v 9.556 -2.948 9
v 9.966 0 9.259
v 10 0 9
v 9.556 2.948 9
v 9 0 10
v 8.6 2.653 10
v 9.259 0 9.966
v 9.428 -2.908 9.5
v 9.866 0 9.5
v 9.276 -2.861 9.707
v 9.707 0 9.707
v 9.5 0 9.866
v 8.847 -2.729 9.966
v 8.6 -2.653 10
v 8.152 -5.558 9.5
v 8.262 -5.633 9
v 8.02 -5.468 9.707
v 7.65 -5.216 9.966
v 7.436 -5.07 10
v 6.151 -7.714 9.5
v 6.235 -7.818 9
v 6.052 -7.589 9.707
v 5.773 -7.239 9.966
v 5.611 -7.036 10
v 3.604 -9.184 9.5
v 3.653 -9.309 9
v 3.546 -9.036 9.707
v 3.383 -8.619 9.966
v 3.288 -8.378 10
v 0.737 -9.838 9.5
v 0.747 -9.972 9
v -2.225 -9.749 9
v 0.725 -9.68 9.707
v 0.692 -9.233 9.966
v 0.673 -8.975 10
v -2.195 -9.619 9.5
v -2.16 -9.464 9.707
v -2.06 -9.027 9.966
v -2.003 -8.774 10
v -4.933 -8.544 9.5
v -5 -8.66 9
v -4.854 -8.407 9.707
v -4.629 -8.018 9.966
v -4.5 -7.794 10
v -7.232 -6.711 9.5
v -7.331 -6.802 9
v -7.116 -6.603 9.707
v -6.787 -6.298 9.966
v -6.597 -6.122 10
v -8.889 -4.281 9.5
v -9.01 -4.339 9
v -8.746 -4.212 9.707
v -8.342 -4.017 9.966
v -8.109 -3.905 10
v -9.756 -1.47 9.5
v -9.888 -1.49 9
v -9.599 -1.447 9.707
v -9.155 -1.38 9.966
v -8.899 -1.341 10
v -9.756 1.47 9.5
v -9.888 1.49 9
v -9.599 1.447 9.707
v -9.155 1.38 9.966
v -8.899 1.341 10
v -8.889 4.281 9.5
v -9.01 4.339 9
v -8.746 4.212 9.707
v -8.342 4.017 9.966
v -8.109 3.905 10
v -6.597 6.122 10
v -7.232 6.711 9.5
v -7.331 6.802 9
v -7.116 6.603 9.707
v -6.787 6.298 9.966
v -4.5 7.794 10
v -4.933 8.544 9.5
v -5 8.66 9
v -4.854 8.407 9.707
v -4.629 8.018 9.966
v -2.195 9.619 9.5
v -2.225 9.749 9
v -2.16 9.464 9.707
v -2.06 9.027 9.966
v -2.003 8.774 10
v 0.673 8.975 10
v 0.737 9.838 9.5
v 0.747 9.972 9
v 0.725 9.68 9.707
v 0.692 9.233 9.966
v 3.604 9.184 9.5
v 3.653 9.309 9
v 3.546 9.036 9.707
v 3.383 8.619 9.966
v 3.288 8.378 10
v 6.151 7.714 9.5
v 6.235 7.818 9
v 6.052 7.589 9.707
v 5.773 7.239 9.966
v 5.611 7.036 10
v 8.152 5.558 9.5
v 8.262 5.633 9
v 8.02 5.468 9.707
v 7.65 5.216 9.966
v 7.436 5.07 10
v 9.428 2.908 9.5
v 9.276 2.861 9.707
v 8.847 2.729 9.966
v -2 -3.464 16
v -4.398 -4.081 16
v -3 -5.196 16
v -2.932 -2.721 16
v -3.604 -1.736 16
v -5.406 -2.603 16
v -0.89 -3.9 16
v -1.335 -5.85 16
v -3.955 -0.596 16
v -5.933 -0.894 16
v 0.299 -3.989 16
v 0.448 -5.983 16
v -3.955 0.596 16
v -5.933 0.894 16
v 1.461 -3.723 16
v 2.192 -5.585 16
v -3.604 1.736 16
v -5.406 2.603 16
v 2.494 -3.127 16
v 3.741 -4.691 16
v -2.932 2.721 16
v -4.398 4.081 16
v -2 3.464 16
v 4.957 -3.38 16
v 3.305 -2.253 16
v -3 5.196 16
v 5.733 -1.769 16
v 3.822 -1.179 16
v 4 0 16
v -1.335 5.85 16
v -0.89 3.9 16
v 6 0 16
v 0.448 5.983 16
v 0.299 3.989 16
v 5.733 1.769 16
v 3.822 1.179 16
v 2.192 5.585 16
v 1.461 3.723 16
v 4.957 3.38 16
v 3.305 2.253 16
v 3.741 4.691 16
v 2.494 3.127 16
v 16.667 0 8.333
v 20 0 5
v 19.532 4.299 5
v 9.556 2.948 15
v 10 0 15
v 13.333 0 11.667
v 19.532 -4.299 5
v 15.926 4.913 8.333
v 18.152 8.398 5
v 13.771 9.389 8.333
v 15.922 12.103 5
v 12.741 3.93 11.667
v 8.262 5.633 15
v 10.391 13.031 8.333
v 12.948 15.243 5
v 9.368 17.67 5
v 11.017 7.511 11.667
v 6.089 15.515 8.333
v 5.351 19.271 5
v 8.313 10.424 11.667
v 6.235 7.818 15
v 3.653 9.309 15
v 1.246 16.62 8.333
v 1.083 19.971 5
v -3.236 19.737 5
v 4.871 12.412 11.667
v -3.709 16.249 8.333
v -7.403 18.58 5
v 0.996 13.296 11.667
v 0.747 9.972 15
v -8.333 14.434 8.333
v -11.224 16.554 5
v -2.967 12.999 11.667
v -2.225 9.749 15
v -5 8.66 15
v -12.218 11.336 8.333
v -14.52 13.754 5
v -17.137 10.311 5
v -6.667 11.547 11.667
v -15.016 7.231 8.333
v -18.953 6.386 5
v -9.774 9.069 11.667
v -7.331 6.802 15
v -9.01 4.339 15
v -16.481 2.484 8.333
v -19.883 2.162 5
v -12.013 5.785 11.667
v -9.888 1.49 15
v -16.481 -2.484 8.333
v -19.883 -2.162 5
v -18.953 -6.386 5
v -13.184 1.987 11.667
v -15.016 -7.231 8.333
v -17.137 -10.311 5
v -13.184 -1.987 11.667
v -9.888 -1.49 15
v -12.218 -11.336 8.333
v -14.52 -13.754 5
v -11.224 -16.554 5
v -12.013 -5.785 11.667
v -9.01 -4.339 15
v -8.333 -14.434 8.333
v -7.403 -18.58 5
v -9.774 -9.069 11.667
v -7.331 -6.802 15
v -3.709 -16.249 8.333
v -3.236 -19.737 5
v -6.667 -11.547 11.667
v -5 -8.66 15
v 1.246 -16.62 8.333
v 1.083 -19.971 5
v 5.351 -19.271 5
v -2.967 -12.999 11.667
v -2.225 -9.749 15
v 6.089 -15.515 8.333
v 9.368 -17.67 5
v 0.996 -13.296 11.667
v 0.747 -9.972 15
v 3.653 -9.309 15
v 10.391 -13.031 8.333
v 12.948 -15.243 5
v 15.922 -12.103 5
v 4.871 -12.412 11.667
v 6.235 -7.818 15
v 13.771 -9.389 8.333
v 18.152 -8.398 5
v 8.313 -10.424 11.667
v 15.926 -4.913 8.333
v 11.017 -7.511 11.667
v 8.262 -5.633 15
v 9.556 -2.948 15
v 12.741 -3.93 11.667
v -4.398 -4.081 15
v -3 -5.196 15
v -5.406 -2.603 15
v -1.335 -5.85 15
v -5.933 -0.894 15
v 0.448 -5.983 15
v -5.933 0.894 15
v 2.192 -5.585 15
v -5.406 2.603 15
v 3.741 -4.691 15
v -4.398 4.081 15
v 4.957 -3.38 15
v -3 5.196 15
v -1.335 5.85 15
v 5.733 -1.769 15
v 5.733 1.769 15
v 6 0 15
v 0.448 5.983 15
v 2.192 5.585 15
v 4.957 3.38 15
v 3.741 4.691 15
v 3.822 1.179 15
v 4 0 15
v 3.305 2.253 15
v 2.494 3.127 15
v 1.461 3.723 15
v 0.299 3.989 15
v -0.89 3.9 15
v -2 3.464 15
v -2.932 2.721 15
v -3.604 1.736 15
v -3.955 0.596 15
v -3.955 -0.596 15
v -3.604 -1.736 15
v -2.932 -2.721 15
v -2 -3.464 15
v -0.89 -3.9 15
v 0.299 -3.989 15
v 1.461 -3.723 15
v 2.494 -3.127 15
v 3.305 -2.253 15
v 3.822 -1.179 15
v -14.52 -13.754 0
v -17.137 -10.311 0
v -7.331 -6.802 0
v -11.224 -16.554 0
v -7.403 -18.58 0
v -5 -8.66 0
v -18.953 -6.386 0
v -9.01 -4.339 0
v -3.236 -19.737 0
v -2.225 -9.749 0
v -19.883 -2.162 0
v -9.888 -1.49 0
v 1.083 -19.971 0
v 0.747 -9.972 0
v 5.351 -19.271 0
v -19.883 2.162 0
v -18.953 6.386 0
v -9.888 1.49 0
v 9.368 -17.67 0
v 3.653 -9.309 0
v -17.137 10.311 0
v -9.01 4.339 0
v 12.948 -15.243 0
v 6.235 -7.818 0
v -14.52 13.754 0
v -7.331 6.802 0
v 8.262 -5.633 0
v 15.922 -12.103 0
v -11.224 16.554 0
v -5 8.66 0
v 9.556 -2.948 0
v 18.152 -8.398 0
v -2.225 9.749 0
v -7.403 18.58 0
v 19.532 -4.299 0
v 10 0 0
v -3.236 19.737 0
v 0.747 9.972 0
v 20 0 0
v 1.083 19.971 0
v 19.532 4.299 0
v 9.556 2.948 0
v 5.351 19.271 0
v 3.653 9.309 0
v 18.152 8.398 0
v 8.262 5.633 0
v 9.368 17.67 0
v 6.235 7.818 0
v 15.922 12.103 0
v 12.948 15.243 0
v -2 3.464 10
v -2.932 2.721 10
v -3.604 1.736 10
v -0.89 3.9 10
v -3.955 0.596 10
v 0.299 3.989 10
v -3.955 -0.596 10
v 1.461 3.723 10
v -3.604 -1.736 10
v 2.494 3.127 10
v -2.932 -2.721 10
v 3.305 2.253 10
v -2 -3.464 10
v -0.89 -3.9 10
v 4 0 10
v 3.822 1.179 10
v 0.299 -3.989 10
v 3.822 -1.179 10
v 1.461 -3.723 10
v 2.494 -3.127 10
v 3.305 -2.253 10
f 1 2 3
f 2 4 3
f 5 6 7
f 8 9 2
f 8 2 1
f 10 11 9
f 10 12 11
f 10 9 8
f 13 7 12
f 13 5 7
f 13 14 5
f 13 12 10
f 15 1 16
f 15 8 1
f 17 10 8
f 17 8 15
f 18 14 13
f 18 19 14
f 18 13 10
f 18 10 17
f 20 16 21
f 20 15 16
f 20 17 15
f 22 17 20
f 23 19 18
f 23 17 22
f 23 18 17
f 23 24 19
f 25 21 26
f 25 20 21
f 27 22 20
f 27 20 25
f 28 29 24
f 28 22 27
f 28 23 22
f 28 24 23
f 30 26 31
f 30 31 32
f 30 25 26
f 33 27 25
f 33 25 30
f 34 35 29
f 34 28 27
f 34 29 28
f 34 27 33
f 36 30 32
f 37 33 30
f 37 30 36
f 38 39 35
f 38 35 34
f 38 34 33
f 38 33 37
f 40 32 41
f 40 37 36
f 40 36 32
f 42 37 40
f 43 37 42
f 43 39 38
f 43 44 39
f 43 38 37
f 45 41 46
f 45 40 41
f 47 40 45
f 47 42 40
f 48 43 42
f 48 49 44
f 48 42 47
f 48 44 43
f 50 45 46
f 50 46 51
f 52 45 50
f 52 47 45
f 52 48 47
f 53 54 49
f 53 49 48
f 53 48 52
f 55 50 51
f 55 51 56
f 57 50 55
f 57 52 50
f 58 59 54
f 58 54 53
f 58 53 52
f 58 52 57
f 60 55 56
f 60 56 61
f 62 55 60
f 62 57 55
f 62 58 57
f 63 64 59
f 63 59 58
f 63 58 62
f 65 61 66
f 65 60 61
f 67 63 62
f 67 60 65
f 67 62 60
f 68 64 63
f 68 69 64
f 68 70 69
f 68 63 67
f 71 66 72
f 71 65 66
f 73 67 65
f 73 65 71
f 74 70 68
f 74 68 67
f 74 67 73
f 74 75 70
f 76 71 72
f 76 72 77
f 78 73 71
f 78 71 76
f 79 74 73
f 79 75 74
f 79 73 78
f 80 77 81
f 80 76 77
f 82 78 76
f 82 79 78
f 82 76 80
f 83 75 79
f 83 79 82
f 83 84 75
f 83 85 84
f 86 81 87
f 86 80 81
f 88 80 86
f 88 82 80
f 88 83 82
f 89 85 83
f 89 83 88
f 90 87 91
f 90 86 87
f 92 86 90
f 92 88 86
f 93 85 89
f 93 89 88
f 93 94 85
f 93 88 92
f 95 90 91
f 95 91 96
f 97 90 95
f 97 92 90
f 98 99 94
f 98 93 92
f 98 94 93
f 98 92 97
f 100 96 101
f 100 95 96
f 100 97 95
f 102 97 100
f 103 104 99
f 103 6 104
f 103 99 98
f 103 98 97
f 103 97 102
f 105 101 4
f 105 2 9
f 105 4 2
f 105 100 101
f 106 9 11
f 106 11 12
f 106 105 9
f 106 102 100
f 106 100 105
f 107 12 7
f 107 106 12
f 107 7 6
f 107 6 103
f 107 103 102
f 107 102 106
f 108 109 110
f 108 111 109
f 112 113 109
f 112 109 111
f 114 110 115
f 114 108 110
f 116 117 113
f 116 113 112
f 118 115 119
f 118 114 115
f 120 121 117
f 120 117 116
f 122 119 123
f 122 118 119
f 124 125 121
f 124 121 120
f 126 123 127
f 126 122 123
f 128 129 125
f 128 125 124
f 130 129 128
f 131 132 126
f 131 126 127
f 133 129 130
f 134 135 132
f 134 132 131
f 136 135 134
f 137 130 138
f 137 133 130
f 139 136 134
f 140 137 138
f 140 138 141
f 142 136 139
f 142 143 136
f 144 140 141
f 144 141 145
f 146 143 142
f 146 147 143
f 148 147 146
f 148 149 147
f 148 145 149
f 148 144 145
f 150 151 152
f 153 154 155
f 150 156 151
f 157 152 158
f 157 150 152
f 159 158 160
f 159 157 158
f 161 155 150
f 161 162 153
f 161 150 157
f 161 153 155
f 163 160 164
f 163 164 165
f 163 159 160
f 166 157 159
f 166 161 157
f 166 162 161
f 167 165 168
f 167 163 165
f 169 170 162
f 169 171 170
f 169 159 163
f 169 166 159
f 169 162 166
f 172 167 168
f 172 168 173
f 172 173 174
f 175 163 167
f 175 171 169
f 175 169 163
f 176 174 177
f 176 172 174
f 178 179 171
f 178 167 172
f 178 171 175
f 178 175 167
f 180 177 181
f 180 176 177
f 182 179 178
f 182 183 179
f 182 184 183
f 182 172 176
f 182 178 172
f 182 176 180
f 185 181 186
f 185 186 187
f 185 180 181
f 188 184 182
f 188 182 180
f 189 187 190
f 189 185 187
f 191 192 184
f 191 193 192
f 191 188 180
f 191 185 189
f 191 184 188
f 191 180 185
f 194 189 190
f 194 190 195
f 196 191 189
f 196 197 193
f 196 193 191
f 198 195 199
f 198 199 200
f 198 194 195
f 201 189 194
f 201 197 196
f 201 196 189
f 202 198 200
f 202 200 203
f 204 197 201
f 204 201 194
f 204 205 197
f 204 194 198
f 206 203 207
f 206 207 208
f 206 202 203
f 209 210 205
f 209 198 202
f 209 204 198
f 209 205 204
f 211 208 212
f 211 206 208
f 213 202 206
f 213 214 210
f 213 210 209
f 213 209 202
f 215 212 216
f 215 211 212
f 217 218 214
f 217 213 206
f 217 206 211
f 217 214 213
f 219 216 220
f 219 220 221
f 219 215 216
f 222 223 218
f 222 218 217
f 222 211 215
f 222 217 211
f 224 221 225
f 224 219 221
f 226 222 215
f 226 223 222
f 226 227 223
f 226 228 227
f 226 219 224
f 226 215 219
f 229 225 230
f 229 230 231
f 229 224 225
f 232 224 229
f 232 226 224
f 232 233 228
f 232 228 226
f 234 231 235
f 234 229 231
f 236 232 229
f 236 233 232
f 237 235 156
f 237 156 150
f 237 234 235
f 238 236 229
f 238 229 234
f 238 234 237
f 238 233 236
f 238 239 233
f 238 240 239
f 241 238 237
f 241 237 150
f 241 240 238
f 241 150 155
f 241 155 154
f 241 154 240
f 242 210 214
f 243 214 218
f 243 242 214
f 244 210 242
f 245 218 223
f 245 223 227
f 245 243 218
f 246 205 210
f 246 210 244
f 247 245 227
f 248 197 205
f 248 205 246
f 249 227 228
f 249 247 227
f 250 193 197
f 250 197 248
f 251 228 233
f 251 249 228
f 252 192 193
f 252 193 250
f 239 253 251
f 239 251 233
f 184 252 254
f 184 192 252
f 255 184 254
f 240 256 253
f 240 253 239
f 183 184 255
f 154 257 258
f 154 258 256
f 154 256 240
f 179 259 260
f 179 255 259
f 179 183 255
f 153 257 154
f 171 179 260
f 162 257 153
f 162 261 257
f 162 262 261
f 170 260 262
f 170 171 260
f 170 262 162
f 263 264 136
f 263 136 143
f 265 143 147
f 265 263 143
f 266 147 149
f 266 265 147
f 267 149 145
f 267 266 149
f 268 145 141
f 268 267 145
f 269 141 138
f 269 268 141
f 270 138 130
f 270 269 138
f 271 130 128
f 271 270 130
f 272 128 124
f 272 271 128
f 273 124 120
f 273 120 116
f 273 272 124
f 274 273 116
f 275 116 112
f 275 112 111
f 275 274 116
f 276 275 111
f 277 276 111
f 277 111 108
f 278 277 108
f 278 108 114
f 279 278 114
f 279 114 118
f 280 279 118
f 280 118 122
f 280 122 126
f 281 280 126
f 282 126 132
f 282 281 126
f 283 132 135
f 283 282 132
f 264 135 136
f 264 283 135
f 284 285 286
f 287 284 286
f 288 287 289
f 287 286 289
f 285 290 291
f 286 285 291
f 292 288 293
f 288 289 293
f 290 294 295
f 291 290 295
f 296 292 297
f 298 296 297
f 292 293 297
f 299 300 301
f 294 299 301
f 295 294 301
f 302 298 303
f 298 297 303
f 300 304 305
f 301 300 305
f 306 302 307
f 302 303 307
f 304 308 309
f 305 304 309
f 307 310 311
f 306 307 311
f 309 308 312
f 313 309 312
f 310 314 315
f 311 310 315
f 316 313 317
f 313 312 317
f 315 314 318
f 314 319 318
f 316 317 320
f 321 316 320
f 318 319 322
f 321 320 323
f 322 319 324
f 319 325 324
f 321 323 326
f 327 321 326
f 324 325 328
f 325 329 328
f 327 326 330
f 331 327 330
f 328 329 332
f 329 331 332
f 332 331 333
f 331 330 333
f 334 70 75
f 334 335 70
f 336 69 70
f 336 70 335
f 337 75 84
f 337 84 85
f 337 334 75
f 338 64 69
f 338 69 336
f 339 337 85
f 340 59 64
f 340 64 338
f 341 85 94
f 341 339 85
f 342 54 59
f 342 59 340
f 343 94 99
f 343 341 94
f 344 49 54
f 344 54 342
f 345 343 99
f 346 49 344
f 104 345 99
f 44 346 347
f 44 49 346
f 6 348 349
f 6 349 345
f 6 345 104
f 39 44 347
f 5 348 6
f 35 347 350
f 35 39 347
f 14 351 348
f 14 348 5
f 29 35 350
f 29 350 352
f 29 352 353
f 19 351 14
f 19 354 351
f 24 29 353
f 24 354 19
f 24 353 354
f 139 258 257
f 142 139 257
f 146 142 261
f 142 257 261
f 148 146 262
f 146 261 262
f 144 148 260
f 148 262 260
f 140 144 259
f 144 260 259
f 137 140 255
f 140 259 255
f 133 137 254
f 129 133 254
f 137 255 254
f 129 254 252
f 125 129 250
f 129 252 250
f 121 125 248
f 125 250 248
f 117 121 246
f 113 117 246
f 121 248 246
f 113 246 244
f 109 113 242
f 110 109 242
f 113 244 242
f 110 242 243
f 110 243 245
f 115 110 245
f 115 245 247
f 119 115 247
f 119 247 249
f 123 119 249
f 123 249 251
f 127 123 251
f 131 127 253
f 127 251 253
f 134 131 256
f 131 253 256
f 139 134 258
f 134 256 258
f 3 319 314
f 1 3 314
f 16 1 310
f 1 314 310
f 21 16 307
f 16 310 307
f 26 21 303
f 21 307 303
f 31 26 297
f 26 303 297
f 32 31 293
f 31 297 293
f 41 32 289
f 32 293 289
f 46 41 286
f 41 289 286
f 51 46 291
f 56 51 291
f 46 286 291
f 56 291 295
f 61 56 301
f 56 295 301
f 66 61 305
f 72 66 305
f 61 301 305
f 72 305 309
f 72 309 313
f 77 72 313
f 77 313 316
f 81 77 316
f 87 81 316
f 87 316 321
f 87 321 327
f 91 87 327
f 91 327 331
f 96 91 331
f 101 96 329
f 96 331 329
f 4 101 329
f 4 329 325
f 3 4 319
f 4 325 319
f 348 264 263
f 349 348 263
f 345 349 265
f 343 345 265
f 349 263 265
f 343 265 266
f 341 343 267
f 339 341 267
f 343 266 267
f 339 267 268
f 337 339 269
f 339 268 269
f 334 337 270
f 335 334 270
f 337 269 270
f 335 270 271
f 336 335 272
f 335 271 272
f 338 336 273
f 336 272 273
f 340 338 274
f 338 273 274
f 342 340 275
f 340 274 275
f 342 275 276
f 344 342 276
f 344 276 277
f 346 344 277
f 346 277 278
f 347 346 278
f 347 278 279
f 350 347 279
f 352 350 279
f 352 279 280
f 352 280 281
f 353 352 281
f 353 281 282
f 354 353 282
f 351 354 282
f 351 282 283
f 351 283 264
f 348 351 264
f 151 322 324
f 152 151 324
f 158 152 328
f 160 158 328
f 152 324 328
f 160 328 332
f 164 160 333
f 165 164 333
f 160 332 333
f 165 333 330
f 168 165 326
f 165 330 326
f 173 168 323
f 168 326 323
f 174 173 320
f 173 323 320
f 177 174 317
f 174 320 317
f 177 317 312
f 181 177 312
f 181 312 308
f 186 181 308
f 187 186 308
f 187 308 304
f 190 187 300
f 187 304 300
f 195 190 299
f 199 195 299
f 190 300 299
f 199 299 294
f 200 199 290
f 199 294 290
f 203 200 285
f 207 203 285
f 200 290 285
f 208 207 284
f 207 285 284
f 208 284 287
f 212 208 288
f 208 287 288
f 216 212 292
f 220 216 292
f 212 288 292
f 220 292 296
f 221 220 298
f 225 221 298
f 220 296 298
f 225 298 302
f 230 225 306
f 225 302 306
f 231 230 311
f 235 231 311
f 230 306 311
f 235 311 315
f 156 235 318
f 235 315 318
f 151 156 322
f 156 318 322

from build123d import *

# Parameters (mm, degrees)
F0_R     = 20
F1_DEPTH = 15
F2_SIZE  = 10
F3_R     = 6
F3_R_2   = 4
F4_DEPTH = 1
F5_R     = 4
F6_DEPTH = 15.001
F7_R     = 10
F8_DEPTH = 10
F9_R     = 1


with BuildPart() as f1:
    # F0 (on Top) → F1 (new body)
    with BuildSketch(Plane.XY):
        Circle(F0_R)
    extrude(amount=F1_DEPTH)

    # F2
    f2_edges = [f1.edges().sort_by_distance(p)[0] for p in [
        (-20, 0, 15),
    ]]
    chamfer(f2_edges, length=F2_SIZE)

    # F3 (on face) → F4 (join)
    with BuildSketch(Plane.XY.offset(15)):
        Circle(F3_R)
        Circle(F3_R_2, mode=Mode.SUBTRACT)
    extrude(amount=F4_DEPTH)

    # F5 (on face) → F6 (cut, through all)
    with BuildSketch(Plane.XY.offset(15)):
        Circle(F5_R)
    extrude(amount=-F6_DEPTH, mode=Mode.SUBTRACT)

    # F7 (on face) → F8 (cut)
    with BuildSketch(Plane(origin=(0, 0, 0), x_dir=(1, 0, 0), z_dir=(0, 0, -1))):
        Circle(F7_R)
    extrude(amount=-F8_DEPTH, mode=Mode.SUBTRACT)

    # F9
    f9_edges = [f1.edges().sort_by_distance(p)[0] for p in [
        (-10, 0, 10),
    ]]
    fillet(f9_edges, radius=F9_R)


solid = f1.part
